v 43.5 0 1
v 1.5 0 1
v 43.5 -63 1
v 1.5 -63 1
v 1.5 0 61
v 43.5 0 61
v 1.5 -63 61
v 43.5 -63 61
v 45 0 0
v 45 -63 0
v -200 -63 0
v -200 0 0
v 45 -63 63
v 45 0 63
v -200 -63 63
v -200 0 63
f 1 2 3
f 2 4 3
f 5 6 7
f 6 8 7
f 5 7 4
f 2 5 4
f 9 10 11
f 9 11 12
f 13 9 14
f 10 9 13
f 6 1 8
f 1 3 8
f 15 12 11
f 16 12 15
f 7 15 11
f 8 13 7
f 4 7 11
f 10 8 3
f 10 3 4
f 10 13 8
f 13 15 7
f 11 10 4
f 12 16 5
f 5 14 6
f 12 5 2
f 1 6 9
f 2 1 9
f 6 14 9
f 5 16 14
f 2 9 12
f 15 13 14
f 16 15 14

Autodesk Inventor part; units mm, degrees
ref_plane "YZ Plane" through (0, 0, 0) normal (1, 0, 0) x (0, 1, 0)
ref_plane "XZ Plane" through (0, 0, 0) normal (0, 1, 0) x (-1, 0, 0)
ref_plane "XY Plane" through (0, 0, 0) normal (0, 0, 1) x (1, 0, 0)
sketch "Sketch7" plane through (0, 0, 0) normal (0, 0, 1) x (1, 0, 0)
  line L0 (0, 0) -> (45, 0)
  line L1 (45, 0) -> (45, -63)
  line L2 (45, -63) -> (0, -63)
  line L3 (0, -63) -> (0, 0)
  dimension "d19" = 45
  dimension "d20" = 63
extrude "Extrusion3" add sketch "Sketch7" along normal blind 63
sketch "Sketch8" plane through (0, -63, 0) normal (0, -1, 0) x (1, 0, 0)
  line L0 (0, 0) -> (45, 0) projected
  line L1 (1.5, 0) -> (0, 0)
  line L2 (1.5, 1) -> (43.5, 1)
  line L3 (43.5, 1) -> (43.5, 61)
  line L4 (43.5, 61) -> (1.5, 61)
  line L5 (1.5, 61) -> (1.5, 1)
  dimension "d26" = 42
  dimension "d27" = 60
extrude "Extrusion4" cut sketch "Sketch8" against normal blind 63
sketch "Sketch9" plane through (0, 0, 63) normal (0, 0, 1) x (1, 0, 0)
  point P0 (0, 0)
sketch "Sketch10" plane through (0, -63, 0) normal (-1, 0, 0) x (0, 0, 1)
  line L0 (63, 0) -> (63, 63) projected
  line L1 (63, 0) -> (0, 0)
  line L2 (0, 0) -> (0, 6.1882)
  line L3 (0, 6.1882) -> (63, 6.1882)
  line L4 (63, 6.1882) -> (63, 0)
  point P0 (0, 63)
extrude "Extrusion5" add sketch "Sketch10" along normal blind 200
sketch "Sketch11" plane through (0, 0, 0) normal (-1, 0, 0) x (0, 0, 1)
  line L0 (63, -63) -> (63, 0) projected
  line L1 (0, 0) -> (0, -56.8118) projected
  line L2 (63, 0) -> (0, 0)
  line L3 (0, 0) -> (0, -56.8129)
  line L4 (0, -56.8129) -> (63, -56.8129)
  line L5 (63, -56.8129) -> (63, 0)
extrude "Extrusion6" add sketch "Sketch11" along normal blind 200
equation "\"BendRadius\" = Thickness"
equation "\"BendReliefWidth\" = Thickness"
equation "\"BendReliefDepth\" = 0.5 * Thickness"
equation "\"CornerReliefSize\" = 4 * Thickness"
equation "\"MinimumRemnant\" = 2 * Thickness"
equation "\"TransitionRadius\" = BendRadius"
equation "\"JacobiRadiusSize\" = BendRadius"
equation "\"GapSize\" = Thickness"
equation "\"Thickness\" = 0.5"
properties part number "soporte para motor"
